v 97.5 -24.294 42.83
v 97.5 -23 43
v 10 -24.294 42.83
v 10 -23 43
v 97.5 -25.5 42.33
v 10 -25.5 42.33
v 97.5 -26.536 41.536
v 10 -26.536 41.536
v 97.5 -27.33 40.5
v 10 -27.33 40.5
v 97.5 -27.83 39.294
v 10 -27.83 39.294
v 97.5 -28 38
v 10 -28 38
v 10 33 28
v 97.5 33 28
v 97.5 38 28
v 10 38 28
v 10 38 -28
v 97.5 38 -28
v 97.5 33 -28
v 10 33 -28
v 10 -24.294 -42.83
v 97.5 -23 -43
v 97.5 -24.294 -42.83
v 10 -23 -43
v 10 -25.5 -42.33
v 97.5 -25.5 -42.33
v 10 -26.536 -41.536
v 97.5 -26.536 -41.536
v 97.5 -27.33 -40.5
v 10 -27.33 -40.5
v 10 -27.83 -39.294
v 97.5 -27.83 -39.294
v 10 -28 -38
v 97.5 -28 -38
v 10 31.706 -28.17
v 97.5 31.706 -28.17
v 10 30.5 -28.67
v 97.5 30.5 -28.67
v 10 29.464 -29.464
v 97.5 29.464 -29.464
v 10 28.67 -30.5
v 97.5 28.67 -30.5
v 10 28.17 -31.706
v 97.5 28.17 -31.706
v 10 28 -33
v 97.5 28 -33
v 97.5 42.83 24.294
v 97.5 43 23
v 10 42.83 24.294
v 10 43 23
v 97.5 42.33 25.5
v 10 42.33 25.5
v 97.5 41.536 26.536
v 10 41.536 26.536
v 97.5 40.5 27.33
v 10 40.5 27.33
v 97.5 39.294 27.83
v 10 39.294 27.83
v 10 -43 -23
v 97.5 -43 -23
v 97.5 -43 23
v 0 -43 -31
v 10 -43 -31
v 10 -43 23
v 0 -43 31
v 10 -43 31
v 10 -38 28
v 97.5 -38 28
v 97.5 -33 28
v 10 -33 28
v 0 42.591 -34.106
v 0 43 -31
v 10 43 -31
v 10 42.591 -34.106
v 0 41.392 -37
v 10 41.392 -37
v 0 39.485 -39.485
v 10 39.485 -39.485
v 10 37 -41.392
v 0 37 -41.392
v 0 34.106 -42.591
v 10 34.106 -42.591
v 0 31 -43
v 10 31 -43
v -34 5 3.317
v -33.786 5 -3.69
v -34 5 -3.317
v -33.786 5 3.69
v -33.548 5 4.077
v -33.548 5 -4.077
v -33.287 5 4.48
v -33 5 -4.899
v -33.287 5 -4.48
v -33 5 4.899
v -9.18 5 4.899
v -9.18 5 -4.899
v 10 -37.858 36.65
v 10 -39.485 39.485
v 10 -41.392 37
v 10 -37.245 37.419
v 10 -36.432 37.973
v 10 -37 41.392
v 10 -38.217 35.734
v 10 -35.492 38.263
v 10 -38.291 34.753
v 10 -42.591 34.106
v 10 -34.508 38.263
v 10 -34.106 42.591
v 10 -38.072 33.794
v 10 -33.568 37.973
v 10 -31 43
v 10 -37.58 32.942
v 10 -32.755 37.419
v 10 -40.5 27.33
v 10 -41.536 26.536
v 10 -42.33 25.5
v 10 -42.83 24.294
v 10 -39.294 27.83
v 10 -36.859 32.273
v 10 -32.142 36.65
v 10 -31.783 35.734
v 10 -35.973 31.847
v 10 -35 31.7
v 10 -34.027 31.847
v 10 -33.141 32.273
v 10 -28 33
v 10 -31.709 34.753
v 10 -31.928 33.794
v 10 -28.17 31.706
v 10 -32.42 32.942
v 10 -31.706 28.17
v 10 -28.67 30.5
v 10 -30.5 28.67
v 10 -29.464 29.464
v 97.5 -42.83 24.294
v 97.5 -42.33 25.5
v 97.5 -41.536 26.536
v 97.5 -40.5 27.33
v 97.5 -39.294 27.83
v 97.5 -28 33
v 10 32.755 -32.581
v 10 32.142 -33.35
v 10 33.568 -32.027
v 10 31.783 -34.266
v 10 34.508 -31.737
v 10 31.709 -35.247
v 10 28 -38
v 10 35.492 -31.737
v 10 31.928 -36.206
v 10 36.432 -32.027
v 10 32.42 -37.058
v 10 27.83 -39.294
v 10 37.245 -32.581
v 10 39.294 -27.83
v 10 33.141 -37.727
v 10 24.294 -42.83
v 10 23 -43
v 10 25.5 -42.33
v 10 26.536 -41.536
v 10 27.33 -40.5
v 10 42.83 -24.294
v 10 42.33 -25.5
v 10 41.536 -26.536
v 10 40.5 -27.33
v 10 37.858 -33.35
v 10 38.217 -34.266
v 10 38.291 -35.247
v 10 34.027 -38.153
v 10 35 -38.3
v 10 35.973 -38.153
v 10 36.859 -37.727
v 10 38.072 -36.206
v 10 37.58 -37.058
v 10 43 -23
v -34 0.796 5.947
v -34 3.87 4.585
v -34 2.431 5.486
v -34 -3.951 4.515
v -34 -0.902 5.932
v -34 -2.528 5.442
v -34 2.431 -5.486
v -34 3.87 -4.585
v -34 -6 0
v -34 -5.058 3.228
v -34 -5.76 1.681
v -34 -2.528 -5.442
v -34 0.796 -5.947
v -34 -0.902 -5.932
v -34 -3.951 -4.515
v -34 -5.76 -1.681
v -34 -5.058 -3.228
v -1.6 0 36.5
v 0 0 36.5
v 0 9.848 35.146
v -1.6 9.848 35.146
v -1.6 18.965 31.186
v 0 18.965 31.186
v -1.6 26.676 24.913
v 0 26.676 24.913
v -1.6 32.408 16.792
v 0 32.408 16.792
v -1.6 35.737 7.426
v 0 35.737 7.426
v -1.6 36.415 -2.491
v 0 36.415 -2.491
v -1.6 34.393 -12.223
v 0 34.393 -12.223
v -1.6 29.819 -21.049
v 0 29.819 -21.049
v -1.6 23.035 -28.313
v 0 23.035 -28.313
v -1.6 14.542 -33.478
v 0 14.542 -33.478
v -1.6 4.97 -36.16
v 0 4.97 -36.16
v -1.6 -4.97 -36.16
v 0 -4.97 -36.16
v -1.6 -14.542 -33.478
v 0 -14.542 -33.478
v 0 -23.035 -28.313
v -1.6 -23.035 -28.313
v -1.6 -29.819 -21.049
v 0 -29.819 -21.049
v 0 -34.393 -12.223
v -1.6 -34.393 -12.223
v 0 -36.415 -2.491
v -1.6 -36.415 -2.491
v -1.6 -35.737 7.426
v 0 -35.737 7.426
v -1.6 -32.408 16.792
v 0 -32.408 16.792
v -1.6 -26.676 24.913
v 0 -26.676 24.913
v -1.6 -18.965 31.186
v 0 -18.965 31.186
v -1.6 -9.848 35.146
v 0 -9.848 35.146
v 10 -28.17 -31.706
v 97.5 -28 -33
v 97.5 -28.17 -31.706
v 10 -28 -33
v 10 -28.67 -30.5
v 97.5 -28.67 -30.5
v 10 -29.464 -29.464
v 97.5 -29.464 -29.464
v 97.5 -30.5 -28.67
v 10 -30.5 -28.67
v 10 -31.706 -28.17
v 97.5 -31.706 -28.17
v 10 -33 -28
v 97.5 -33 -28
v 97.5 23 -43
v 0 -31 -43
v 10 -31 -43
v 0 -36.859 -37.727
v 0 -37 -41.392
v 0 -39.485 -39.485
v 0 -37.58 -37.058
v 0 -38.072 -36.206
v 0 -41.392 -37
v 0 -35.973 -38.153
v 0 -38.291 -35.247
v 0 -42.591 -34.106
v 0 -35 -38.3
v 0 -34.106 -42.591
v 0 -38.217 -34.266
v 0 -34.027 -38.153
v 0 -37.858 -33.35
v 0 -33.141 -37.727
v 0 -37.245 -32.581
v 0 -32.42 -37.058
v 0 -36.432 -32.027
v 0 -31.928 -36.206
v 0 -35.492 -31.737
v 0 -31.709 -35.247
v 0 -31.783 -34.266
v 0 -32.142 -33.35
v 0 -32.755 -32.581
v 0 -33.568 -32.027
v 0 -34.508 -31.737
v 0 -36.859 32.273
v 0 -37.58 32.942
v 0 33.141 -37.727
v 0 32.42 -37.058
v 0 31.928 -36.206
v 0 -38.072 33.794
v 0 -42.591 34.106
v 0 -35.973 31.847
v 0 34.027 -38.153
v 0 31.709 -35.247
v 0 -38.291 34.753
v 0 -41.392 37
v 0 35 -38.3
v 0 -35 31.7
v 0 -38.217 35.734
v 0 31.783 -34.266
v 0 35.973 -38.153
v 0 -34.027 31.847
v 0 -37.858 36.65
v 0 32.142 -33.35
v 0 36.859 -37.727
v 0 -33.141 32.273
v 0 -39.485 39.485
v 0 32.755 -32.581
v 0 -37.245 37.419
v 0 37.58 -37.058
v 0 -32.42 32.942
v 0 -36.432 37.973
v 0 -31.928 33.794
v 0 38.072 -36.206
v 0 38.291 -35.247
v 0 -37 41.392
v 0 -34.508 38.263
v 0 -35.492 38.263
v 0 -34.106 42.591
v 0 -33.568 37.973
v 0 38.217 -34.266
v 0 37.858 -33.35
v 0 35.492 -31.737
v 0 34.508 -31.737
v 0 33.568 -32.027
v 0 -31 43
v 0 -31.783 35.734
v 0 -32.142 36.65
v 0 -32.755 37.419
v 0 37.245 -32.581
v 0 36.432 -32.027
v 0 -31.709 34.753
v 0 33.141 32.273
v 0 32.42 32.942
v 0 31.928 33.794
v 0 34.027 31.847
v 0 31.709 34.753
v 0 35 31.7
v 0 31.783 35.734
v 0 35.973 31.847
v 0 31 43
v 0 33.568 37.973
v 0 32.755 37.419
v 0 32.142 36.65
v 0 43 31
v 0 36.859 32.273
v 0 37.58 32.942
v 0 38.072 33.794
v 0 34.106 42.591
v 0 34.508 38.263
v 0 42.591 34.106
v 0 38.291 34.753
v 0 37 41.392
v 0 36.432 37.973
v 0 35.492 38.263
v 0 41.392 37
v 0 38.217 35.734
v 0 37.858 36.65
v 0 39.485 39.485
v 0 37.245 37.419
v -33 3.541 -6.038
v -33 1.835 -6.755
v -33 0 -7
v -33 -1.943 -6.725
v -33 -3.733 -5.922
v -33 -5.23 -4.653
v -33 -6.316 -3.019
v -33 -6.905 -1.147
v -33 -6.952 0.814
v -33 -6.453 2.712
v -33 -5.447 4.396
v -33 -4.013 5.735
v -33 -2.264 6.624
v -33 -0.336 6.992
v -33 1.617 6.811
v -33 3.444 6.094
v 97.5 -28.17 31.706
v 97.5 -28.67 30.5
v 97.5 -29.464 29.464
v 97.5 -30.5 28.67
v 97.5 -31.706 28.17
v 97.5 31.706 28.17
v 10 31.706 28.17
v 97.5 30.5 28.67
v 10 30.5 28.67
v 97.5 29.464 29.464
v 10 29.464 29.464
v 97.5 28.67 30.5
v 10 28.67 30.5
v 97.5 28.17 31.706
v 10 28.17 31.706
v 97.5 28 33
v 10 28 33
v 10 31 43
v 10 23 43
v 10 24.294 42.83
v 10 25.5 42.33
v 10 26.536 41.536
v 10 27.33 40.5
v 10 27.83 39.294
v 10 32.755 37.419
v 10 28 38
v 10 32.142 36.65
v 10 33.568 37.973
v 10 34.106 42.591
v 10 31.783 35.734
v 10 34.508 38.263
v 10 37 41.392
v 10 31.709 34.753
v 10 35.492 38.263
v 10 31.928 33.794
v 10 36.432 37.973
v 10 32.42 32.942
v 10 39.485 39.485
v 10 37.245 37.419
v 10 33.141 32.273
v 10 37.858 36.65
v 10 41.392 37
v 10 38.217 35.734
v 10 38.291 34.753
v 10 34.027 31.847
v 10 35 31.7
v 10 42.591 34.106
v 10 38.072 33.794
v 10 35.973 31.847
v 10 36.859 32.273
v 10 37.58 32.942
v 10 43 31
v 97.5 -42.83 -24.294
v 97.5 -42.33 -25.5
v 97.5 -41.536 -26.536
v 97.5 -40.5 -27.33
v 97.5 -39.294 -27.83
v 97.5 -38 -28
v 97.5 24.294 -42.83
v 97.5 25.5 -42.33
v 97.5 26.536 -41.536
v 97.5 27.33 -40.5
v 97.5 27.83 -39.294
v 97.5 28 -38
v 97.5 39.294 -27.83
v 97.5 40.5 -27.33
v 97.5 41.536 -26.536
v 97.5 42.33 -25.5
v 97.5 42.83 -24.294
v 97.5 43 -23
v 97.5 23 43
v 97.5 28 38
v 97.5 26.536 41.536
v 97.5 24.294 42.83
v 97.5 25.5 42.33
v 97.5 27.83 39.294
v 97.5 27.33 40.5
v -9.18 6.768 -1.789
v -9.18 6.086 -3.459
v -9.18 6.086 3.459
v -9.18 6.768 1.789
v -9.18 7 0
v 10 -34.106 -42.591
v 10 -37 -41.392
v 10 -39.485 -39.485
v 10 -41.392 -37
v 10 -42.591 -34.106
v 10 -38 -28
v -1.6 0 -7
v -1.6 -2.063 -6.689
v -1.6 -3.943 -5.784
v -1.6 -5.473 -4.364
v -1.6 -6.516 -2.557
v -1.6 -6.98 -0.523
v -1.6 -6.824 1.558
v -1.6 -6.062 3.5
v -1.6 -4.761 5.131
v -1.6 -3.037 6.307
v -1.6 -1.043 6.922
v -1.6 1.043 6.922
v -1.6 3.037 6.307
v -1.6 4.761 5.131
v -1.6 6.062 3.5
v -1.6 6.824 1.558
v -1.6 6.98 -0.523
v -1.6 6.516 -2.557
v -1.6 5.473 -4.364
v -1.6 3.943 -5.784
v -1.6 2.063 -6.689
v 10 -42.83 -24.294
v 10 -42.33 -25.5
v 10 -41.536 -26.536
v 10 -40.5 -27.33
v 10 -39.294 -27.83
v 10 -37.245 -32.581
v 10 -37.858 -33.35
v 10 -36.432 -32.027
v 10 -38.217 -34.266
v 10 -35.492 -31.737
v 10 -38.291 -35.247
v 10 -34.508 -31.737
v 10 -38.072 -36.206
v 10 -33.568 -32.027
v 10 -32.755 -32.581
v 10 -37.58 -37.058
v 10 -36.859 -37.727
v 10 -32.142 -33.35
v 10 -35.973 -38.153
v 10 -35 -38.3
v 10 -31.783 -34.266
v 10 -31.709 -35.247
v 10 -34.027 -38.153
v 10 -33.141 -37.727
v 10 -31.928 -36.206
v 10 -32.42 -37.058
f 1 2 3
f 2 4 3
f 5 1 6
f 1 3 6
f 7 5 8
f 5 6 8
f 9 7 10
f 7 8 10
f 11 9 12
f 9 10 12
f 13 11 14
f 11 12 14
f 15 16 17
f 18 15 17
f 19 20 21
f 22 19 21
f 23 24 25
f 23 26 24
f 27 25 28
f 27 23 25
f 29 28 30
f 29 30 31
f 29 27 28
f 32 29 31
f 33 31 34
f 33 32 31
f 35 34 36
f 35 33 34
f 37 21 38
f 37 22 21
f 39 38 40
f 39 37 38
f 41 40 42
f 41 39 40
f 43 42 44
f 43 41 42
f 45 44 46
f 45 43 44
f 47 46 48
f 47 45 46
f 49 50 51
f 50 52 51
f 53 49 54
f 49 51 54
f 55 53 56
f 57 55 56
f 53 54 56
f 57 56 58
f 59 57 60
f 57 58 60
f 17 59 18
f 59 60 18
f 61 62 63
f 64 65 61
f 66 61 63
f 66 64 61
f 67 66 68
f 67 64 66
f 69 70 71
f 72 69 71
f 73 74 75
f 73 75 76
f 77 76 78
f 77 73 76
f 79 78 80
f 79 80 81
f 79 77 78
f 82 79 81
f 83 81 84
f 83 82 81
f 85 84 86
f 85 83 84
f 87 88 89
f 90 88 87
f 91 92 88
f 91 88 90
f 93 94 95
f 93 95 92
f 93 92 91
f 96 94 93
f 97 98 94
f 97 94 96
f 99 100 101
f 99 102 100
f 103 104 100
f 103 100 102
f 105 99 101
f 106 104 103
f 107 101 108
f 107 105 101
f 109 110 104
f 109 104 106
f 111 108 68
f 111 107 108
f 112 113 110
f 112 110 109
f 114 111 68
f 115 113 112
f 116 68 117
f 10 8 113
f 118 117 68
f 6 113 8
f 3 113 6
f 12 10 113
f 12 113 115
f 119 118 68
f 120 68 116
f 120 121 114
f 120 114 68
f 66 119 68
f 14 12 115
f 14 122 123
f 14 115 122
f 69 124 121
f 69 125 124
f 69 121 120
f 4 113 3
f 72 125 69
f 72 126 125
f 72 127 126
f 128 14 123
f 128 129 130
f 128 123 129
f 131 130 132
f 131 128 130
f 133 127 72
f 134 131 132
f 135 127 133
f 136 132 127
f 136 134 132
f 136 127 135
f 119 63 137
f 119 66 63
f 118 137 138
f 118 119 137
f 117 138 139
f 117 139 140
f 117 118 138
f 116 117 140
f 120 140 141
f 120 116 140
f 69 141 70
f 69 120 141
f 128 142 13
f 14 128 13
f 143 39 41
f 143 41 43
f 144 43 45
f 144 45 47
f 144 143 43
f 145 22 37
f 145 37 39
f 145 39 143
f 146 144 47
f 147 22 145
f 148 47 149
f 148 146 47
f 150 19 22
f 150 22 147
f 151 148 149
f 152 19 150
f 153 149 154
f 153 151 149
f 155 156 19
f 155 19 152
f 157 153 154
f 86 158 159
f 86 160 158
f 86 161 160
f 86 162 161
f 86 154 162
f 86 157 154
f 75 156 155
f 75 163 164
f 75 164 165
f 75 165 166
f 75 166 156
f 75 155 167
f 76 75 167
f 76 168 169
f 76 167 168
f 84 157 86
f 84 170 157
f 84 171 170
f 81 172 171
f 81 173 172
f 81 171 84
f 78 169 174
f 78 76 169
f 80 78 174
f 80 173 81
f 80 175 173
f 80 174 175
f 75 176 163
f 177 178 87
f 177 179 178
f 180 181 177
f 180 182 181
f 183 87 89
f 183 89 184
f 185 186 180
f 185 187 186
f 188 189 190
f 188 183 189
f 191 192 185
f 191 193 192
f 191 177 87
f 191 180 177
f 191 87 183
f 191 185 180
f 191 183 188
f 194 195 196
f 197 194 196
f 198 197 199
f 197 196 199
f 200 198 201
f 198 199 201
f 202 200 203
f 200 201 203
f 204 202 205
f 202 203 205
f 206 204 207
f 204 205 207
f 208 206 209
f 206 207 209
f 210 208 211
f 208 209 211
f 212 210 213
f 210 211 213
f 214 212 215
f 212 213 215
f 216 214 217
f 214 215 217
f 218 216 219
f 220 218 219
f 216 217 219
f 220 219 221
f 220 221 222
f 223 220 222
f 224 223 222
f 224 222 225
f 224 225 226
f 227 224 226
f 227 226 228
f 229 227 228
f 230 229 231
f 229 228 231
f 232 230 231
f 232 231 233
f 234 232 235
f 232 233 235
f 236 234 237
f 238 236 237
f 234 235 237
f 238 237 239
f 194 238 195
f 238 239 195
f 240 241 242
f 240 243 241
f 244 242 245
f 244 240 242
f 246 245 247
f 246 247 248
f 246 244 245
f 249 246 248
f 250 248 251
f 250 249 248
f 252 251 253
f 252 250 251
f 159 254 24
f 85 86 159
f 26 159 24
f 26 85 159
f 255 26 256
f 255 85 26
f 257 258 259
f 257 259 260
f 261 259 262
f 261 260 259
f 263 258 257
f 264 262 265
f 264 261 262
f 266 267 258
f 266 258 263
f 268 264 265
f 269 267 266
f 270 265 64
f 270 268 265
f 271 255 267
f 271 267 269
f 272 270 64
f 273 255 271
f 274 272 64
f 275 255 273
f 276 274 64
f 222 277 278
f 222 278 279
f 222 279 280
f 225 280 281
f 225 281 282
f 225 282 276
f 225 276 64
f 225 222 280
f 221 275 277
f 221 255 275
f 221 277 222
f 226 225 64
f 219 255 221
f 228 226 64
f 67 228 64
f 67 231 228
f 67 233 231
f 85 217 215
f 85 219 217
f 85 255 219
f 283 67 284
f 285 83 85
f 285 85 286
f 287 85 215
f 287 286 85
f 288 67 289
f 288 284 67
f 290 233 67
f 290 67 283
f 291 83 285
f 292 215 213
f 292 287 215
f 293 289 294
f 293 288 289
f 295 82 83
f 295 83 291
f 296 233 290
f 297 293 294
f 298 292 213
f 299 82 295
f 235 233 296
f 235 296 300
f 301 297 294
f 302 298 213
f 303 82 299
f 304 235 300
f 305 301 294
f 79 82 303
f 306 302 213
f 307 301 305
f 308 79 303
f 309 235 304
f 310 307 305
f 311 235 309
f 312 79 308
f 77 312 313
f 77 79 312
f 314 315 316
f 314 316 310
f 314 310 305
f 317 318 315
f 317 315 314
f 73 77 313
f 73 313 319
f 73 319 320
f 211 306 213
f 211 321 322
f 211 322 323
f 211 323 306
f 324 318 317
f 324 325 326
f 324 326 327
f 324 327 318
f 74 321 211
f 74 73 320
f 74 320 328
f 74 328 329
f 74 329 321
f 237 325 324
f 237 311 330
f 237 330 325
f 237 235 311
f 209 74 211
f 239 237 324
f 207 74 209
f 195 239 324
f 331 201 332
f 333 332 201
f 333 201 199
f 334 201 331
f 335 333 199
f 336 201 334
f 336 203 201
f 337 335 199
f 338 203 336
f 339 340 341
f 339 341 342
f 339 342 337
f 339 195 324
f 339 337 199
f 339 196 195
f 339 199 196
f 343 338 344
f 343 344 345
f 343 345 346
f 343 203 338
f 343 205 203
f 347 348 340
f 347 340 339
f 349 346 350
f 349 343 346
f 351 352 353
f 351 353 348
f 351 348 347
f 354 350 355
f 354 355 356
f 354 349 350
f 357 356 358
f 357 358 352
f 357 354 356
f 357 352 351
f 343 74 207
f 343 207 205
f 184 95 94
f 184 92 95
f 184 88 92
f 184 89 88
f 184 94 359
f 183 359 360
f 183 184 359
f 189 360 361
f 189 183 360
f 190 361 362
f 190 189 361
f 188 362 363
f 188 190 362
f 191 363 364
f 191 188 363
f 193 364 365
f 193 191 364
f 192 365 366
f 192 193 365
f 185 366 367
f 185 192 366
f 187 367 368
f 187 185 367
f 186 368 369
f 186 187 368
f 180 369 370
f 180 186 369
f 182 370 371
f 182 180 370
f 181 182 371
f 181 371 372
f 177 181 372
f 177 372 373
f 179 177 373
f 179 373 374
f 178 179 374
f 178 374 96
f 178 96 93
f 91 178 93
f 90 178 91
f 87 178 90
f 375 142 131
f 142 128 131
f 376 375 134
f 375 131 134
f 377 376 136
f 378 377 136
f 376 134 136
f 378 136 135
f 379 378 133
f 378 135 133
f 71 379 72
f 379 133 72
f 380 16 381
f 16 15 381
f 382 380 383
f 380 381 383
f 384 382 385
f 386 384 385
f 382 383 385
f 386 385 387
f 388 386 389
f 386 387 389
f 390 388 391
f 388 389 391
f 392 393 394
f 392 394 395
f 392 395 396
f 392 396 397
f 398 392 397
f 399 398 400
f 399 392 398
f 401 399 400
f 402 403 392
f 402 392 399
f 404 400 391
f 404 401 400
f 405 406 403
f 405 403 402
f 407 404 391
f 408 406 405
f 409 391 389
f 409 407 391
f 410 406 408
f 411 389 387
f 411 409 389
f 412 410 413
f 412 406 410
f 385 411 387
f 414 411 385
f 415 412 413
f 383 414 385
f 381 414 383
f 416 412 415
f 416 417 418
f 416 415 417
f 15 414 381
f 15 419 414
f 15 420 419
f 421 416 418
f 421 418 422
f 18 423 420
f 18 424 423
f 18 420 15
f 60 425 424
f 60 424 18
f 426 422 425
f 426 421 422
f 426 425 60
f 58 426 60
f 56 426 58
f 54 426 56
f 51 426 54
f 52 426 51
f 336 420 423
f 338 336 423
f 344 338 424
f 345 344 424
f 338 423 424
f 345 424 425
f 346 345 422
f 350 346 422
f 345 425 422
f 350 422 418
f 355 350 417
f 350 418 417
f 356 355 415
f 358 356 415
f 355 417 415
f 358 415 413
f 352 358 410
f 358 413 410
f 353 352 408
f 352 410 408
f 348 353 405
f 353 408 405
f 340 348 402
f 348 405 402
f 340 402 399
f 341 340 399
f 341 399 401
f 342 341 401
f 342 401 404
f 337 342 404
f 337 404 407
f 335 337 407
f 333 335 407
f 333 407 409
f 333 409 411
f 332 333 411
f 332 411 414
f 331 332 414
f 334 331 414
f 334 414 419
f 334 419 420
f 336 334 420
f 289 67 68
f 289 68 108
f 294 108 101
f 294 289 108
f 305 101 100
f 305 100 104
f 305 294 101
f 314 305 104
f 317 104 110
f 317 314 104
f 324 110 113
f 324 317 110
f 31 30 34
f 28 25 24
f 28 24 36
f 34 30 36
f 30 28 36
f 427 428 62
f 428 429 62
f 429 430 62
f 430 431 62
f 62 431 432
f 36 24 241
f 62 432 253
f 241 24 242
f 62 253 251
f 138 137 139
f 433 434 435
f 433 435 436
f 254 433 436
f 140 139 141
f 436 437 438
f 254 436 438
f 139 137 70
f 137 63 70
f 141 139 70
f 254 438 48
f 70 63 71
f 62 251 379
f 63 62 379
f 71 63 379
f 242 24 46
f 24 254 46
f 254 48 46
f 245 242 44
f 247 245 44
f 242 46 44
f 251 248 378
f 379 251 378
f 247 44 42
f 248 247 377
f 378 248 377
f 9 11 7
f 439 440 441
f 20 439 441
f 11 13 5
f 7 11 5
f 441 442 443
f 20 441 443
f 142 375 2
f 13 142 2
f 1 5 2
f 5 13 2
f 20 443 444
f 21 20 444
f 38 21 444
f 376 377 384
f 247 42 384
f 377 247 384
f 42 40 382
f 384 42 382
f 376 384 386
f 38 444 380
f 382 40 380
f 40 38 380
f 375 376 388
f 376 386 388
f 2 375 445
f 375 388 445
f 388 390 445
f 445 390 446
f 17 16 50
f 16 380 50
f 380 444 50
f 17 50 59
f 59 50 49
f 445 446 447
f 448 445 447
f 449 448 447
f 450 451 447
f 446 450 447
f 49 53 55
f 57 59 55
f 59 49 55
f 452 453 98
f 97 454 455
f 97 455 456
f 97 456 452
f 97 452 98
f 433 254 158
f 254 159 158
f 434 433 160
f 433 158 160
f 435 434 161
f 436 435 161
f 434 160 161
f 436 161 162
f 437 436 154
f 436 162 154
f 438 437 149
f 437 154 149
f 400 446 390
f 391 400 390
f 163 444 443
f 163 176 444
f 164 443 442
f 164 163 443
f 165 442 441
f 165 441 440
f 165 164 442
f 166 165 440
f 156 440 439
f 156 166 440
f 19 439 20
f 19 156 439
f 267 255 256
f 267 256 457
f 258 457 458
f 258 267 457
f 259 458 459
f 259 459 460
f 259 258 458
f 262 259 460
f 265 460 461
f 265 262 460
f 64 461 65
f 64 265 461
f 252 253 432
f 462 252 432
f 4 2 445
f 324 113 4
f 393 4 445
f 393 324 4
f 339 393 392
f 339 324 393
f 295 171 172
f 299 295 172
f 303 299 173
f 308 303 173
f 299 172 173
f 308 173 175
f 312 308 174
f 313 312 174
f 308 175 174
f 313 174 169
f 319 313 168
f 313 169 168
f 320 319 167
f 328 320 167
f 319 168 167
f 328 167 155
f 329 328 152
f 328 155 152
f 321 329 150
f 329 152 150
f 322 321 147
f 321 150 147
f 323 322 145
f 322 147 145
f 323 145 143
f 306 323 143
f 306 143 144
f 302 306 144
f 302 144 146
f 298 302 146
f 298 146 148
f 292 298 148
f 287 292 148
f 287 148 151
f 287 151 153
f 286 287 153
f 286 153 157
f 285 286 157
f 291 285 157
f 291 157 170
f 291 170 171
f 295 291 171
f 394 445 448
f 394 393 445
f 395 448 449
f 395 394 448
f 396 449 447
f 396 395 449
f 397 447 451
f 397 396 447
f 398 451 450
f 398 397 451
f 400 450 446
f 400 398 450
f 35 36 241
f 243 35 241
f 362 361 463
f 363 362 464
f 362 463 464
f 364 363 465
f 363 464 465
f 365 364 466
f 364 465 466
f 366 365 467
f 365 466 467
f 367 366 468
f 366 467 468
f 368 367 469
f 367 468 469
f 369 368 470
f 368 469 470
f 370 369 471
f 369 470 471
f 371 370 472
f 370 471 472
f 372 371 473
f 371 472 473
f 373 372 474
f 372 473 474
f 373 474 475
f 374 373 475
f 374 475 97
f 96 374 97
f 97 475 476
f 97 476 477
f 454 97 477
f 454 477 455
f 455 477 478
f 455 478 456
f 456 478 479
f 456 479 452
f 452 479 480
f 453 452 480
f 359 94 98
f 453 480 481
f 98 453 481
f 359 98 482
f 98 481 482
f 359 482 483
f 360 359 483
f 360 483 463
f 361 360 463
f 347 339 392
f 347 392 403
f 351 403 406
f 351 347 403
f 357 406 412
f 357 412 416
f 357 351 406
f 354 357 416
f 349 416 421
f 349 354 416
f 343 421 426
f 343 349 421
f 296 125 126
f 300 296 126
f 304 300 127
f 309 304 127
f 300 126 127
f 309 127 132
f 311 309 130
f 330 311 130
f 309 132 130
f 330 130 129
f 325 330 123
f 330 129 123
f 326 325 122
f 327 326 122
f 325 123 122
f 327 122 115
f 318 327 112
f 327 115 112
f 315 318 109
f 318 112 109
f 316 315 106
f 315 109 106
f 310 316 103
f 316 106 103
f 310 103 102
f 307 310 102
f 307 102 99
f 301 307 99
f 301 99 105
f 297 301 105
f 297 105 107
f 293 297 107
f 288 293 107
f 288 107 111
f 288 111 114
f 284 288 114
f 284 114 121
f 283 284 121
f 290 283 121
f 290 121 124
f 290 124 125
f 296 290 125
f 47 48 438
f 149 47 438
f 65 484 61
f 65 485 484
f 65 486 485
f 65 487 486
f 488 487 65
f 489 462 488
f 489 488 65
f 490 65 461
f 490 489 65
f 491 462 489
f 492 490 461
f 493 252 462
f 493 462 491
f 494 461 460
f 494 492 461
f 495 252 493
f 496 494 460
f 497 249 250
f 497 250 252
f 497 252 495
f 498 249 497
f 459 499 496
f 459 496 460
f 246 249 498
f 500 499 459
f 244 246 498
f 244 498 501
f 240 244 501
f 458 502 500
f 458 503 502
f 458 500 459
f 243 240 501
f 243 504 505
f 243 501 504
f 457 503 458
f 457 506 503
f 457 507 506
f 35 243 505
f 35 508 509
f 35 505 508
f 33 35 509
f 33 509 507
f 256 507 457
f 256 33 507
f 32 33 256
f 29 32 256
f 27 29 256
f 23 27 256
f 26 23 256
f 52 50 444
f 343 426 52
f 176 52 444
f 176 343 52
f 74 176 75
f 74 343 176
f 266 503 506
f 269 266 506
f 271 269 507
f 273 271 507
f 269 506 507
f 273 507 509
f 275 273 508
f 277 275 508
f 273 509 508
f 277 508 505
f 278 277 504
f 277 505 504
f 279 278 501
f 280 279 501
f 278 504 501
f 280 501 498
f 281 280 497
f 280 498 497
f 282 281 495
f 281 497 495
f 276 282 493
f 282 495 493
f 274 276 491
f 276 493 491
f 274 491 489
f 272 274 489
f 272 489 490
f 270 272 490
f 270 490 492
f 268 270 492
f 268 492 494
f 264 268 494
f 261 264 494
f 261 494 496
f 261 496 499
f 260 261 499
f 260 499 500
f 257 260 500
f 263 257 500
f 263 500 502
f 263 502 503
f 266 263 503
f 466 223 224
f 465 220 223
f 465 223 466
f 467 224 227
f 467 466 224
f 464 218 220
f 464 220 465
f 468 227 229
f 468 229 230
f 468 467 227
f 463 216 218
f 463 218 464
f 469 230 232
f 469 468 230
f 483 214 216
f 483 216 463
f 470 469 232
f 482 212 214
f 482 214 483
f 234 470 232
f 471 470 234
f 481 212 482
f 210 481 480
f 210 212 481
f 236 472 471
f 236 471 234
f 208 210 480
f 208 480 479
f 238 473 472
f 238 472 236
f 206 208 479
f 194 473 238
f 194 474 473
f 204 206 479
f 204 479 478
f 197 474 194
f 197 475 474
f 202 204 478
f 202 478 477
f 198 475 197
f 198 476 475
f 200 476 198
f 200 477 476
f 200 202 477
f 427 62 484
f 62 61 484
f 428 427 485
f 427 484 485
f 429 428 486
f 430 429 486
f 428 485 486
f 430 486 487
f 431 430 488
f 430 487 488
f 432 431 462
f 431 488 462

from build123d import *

# Parameters (mm, degrees)
BOSS_EXTRUDE1_DEPTH  = 97.5
SKETCH2_R            = 36.5
BOSS_EXTRUDE2_DEPTH  = 1.6
BOSS_EXTRUDE4_START  = -1.6
SKETCH3_R            = 7
BOSS_EXTRUDE4_DEPTH  = 34
CUT_EXTRUDE1_START   = -24.820064241
CUT_EXTRUDE1_DEPTH   = 24.820064241
SKETCH12_OUTSIDE_W   = 123.824
SKETCH12_OUTSIDE_H   = 123.824
CUT_EXTRUDE2_DEPTH   = 87.5
M6_CLEARANCE_HOLE2_D = 6.6
FILLET1_R            = 5
CHAMFER1_SIZE        = 1


with BuildPart() as part:
    # Sketch1 → Boss-Extrude1 (new body)
    with BuildSketch(Plane(origin=(0, 0, 0), x_dir=(0, 0, -1), z_dir=(1, 0, 0))):
        with BuildLine():
            Line((-31, 43), (31, 43))
            ThreePointArc((31, 43), (39.485281374, 39.485281374), (43, 31))
            Line((43, 31), (43, -31))
            ThreePointArc((43, -31), (39.485281374, -39.485281374), (31, -43))
            Line((31, -43), (-31, -43))
            ThreePointArc((-31, -43), (-39.485281374, -39.485281374), (-43, -31))
            Line((-43, -31), (-43, 31))
            ThreePointArc((-43, 31), (-39.485281374, 39.485281374), (-31, 43))
        make_face()
    extrude(amount=BOSS_EXTRUDE1_DEPTH)

    # Sketch2 → Boss-Extrude2 (add)
    with BuildSketch(Plane.ZY):
        Circle(SKETCH2_R)
    extrude(amount=BOSS_EXTRUDE2_DEPTH)

    # Sketch3 → Boss-Extrude4 (add)
    with BuildSketch(Plane.ZY.offset(1.6).offset(BOSS_EXTRUDE4_START)):
        with Locations(Location((0, 0, 0), (0, 0, 180))):
            Circle(SKETCH3_R)
    extrude(amount=BOSS_EXTRUDE4_DEPTH)

    # Sketch4 → Cut-Extrude1 (cut)
    with BuildSketch(Plane.ZY.offset(34).offset(CUT_EXTRUDE1_START)):
        with BuildLine():
            Line((-4.898979486, 5), (4.898979486, 5))
            ThreePointArc((4.898979486, 5), (0, 7), (-4.898979486, 5))
        make_face()
    extrude(amount=CUT_EXTRUDE1_DEPTH, mode=Mode.SUBTRACT)

    # Sketch12 outside → Cut-Extrude2 (cut)
    with BuildSketch(Plane(origin=(97.5, 0, 0), x_dir=(0, 0, -1), z_dir=(1, 0, 0))):
        Rectangle(SKETCH12_OUTSIDE_W, SKETCH12_OUTSIDE_H)
        Polygon((-28, 43), (28, 43), (28, 28), (43, 28), (43, -28), (28, -28), (28, -43), (-28, -43), (-28, -28), (-43, -28), (-43, 28), (-28, 28), align=None, mode=Mode.SUBTRACT)
    extrude(amount=-CUT_EXTRUDE2_DEPTH, mode=Mode.SUBTRACT)

    # M6 Clearance Hole2 (through all)
    with Locations(Plane.ZY):
        with Locations((-35, 35), (35, 35), (35, -35), (-35, -35)):
            Hole(M6_CLEARANCE_HOLE2_D / 2)

    # Fillet1
    fillet1_edges = [part.edges().sort_by_distance(p)[0] for p in [
        (53.75, 28, 28),
        (53.75, 28, 43),
        (53.75, -28, 43),
        (53.75, -28, 28),
        (53.75, -43, 28),
        (53.75, -43, -28),
        (53.75, -28, -28),
        (53.75, -28, -43),
        (53.75, 28, -43),
        (53.75, 28, -28),
        (53.75, 43, -28),
        (53.75, 43, 28),
    ]]
    fillet(fillet1_edges, radius=FILLET1_R)

    # Chamfer1
    chamfer1_edges = [part.edges().sort_by_distance(p)[0] for p in [
        (-34, -6.453404388, 2.711747002),
    ]]
    chamfer(chamfer1_edges, length=CHAMFER1_SIZE)


solid = part.part
